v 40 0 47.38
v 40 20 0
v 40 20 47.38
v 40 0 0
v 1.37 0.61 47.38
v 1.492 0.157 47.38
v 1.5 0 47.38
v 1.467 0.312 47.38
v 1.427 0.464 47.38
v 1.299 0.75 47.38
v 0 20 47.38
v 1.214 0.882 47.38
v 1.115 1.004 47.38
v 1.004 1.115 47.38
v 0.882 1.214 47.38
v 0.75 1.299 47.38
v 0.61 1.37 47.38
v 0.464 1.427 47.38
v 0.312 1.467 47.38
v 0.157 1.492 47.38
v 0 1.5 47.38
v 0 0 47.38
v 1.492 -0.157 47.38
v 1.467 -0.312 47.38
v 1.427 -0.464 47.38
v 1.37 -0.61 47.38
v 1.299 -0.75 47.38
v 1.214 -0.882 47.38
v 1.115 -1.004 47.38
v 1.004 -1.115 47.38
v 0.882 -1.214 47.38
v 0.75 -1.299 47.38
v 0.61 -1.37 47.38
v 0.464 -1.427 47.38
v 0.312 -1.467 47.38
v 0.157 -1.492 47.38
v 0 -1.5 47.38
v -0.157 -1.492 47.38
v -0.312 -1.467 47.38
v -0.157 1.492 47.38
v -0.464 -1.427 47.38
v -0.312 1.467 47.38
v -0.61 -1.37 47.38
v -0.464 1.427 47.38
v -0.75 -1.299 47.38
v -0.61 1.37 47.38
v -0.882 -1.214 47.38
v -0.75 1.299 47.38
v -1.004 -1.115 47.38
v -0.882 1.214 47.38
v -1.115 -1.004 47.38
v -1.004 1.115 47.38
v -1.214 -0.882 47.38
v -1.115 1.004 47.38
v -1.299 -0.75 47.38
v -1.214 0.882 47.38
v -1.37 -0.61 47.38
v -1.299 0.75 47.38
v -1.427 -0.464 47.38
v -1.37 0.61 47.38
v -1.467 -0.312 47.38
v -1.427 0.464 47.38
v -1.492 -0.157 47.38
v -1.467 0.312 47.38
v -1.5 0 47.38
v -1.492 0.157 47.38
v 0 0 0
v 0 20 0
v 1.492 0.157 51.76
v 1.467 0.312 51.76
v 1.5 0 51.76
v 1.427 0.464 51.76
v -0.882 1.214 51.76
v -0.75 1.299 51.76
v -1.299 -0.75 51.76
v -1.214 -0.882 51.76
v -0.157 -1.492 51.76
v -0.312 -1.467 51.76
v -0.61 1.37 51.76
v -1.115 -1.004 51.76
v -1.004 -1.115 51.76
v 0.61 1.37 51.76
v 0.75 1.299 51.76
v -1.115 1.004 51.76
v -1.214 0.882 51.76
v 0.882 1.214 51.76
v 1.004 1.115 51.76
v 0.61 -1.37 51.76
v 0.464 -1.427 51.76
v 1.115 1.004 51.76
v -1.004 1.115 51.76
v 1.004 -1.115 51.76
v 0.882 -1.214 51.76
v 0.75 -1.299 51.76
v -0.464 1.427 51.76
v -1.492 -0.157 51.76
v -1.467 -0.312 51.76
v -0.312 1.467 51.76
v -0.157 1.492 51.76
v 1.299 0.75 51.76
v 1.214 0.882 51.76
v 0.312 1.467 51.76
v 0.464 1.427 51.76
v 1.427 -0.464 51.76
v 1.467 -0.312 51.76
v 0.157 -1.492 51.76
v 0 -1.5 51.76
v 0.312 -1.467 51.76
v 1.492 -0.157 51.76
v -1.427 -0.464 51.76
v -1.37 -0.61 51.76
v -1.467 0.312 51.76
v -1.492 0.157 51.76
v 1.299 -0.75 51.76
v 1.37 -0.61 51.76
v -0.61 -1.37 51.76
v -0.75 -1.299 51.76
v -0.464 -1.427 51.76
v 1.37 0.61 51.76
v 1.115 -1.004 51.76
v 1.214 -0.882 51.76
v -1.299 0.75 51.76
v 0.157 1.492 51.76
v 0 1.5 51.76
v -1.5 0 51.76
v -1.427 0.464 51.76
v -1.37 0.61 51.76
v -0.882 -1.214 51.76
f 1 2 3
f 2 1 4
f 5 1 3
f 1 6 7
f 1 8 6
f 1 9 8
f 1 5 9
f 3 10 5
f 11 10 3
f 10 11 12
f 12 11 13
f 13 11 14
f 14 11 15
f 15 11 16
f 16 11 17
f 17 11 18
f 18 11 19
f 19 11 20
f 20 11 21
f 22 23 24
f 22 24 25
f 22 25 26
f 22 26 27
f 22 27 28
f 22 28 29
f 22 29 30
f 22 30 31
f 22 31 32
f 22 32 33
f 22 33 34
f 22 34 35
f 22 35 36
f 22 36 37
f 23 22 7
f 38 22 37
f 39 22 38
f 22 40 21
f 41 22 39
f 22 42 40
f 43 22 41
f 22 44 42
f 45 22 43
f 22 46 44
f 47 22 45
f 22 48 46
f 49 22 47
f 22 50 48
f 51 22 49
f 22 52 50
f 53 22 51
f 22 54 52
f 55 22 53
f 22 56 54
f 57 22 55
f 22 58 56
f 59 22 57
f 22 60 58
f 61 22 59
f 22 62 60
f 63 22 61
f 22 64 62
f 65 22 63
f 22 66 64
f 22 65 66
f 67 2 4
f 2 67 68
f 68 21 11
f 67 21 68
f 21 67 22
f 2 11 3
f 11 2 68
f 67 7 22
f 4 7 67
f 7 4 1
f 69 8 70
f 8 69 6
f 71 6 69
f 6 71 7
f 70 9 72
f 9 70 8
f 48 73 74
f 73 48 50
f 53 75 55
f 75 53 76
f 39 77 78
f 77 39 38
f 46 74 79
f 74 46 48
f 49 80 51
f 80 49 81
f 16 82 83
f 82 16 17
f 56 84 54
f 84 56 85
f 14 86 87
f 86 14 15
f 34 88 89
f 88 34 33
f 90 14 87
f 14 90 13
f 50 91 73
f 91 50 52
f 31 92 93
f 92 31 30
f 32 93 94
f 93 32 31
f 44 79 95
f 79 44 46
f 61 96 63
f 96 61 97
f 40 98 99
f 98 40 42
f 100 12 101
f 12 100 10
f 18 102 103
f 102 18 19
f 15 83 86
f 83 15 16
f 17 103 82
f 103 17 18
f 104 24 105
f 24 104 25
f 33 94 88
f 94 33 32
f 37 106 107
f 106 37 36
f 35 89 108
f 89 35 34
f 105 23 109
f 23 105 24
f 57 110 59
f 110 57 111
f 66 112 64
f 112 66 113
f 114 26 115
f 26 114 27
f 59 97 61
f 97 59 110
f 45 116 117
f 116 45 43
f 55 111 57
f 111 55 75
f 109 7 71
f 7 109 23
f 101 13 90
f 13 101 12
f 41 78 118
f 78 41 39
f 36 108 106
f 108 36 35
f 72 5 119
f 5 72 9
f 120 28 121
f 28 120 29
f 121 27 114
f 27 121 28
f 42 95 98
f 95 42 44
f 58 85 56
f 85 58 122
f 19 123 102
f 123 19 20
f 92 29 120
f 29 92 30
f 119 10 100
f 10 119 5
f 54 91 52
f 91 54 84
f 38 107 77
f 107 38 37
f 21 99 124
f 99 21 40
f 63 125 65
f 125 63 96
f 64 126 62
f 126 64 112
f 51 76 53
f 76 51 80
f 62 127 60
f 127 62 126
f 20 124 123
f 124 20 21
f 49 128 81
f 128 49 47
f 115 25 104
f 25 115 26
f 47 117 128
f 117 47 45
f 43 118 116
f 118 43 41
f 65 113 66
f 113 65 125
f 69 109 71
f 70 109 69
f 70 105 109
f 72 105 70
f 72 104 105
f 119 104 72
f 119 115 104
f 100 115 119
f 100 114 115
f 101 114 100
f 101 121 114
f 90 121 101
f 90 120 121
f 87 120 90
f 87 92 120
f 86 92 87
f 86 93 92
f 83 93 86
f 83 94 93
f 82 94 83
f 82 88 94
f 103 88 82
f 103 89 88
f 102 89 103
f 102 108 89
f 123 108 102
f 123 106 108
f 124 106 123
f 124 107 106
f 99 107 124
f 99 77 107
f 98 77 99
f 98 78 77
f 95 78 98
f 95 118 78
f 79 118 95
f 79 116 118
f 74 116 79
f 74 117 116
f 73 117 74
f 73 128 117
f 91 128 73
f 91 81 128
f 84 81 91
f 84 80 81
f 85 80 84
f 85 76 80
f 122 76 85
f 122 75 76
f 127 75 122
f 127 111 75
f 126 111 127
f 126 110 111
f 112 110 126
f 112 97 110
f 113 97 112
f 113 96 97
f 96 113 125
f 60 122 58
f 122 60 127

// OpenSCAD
x_case = 40;
y_case = 20;
z_case = 47.38;
$fn=60;

module case() {
       cube([x_case,y_case,z_case]);
}



rotor_h = 47.38-43;
module rotor() {
       translate([0,0,z_case]) cylinder(d=3,h=rotor_h);
}

module 35kg_servo() {
  case();
  rotor();
}


35kg_servo();
